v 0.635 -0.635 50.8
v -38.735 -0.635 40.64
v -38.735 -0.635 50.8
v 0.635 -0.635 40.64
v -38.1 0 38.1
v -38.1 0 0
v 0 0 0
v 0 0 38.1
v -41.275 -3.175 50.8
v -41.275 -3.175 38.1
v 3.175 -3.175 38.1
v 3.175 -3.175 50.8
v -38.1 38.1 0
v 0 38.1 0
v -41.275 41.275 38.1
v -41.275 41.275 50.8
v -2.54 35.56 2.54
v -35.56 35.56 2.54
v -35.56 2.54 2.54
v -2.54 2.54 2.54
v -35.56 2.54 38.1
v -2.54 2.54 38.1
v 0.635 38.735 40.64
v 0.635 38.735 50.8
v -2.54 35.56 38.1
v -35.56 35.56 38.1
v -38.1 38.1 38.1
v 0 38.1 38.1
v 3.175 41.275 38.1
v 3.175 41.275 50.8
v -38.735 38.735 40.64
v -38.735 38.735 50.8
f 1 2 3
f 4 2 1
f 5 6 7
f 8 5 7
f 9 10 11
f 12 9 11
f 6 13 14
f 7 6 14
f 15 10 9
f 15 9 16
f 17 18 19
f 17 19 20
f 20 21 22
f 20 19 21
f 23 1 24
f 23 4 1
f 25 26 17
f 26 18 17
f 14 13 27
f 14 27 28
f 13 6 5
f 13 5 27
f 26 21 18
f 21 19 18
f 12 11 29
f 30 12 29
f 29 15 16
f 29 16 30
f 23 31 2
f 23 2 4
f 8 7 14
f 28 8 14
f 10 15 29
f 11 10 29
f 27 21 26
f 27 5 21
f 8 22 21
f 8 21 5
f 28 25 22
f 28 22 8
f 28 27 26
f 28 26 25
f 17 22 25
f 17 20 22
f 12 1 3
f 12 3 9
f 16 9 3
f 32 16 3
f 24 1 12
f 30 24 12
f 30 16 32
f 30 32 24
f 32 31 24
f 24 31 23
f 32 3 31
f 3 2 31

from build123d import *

# Parameters (mm, degrees)
F1_W     = 38.1
F1_H     = 38.1
F2_DEPTH = 38.1
F3_W     = 44.45
F3_H     = 44.45
F4_DEPTH = 12.7
F5_T     = -2.54
F6_T     = -2.54


with BuildPart() as f2:
    # F1 (on face) → F2 (new body)
    with BuildSketch(Plane.XY):
        with Locations((-19.05, 19.05)):
            Rectangle(F1_W, F1_H)
    extrude(amount=F2_DEPTH)

    # F6
    f6_openings = [f2.faces().sort_by_distance(p)[0] for p in [
        (-19.05, 19.05, 38.1),
    ]]
    offset(amount=F6_T, openings=f6_openings)


with BuildPart() as f4:
    # F3 (on face) → F4 (new body)
    with BuildSketch(Plane.XY.offset(38.1)):
        with Locations((-19.05, 19.05)):
            Rectangle(F3_W, F3_H)
    extrude(amount=F4_DEPTH)

    # F5
    f5_openings = [f4.faces().sort_by_distance(p)[0] for p in [
        (-19.05, 19.05, 50.8),
    ]]
    offset(amount=F5_T, openings=f5_openings)


solid = Compound([f2.part, f4.part])
